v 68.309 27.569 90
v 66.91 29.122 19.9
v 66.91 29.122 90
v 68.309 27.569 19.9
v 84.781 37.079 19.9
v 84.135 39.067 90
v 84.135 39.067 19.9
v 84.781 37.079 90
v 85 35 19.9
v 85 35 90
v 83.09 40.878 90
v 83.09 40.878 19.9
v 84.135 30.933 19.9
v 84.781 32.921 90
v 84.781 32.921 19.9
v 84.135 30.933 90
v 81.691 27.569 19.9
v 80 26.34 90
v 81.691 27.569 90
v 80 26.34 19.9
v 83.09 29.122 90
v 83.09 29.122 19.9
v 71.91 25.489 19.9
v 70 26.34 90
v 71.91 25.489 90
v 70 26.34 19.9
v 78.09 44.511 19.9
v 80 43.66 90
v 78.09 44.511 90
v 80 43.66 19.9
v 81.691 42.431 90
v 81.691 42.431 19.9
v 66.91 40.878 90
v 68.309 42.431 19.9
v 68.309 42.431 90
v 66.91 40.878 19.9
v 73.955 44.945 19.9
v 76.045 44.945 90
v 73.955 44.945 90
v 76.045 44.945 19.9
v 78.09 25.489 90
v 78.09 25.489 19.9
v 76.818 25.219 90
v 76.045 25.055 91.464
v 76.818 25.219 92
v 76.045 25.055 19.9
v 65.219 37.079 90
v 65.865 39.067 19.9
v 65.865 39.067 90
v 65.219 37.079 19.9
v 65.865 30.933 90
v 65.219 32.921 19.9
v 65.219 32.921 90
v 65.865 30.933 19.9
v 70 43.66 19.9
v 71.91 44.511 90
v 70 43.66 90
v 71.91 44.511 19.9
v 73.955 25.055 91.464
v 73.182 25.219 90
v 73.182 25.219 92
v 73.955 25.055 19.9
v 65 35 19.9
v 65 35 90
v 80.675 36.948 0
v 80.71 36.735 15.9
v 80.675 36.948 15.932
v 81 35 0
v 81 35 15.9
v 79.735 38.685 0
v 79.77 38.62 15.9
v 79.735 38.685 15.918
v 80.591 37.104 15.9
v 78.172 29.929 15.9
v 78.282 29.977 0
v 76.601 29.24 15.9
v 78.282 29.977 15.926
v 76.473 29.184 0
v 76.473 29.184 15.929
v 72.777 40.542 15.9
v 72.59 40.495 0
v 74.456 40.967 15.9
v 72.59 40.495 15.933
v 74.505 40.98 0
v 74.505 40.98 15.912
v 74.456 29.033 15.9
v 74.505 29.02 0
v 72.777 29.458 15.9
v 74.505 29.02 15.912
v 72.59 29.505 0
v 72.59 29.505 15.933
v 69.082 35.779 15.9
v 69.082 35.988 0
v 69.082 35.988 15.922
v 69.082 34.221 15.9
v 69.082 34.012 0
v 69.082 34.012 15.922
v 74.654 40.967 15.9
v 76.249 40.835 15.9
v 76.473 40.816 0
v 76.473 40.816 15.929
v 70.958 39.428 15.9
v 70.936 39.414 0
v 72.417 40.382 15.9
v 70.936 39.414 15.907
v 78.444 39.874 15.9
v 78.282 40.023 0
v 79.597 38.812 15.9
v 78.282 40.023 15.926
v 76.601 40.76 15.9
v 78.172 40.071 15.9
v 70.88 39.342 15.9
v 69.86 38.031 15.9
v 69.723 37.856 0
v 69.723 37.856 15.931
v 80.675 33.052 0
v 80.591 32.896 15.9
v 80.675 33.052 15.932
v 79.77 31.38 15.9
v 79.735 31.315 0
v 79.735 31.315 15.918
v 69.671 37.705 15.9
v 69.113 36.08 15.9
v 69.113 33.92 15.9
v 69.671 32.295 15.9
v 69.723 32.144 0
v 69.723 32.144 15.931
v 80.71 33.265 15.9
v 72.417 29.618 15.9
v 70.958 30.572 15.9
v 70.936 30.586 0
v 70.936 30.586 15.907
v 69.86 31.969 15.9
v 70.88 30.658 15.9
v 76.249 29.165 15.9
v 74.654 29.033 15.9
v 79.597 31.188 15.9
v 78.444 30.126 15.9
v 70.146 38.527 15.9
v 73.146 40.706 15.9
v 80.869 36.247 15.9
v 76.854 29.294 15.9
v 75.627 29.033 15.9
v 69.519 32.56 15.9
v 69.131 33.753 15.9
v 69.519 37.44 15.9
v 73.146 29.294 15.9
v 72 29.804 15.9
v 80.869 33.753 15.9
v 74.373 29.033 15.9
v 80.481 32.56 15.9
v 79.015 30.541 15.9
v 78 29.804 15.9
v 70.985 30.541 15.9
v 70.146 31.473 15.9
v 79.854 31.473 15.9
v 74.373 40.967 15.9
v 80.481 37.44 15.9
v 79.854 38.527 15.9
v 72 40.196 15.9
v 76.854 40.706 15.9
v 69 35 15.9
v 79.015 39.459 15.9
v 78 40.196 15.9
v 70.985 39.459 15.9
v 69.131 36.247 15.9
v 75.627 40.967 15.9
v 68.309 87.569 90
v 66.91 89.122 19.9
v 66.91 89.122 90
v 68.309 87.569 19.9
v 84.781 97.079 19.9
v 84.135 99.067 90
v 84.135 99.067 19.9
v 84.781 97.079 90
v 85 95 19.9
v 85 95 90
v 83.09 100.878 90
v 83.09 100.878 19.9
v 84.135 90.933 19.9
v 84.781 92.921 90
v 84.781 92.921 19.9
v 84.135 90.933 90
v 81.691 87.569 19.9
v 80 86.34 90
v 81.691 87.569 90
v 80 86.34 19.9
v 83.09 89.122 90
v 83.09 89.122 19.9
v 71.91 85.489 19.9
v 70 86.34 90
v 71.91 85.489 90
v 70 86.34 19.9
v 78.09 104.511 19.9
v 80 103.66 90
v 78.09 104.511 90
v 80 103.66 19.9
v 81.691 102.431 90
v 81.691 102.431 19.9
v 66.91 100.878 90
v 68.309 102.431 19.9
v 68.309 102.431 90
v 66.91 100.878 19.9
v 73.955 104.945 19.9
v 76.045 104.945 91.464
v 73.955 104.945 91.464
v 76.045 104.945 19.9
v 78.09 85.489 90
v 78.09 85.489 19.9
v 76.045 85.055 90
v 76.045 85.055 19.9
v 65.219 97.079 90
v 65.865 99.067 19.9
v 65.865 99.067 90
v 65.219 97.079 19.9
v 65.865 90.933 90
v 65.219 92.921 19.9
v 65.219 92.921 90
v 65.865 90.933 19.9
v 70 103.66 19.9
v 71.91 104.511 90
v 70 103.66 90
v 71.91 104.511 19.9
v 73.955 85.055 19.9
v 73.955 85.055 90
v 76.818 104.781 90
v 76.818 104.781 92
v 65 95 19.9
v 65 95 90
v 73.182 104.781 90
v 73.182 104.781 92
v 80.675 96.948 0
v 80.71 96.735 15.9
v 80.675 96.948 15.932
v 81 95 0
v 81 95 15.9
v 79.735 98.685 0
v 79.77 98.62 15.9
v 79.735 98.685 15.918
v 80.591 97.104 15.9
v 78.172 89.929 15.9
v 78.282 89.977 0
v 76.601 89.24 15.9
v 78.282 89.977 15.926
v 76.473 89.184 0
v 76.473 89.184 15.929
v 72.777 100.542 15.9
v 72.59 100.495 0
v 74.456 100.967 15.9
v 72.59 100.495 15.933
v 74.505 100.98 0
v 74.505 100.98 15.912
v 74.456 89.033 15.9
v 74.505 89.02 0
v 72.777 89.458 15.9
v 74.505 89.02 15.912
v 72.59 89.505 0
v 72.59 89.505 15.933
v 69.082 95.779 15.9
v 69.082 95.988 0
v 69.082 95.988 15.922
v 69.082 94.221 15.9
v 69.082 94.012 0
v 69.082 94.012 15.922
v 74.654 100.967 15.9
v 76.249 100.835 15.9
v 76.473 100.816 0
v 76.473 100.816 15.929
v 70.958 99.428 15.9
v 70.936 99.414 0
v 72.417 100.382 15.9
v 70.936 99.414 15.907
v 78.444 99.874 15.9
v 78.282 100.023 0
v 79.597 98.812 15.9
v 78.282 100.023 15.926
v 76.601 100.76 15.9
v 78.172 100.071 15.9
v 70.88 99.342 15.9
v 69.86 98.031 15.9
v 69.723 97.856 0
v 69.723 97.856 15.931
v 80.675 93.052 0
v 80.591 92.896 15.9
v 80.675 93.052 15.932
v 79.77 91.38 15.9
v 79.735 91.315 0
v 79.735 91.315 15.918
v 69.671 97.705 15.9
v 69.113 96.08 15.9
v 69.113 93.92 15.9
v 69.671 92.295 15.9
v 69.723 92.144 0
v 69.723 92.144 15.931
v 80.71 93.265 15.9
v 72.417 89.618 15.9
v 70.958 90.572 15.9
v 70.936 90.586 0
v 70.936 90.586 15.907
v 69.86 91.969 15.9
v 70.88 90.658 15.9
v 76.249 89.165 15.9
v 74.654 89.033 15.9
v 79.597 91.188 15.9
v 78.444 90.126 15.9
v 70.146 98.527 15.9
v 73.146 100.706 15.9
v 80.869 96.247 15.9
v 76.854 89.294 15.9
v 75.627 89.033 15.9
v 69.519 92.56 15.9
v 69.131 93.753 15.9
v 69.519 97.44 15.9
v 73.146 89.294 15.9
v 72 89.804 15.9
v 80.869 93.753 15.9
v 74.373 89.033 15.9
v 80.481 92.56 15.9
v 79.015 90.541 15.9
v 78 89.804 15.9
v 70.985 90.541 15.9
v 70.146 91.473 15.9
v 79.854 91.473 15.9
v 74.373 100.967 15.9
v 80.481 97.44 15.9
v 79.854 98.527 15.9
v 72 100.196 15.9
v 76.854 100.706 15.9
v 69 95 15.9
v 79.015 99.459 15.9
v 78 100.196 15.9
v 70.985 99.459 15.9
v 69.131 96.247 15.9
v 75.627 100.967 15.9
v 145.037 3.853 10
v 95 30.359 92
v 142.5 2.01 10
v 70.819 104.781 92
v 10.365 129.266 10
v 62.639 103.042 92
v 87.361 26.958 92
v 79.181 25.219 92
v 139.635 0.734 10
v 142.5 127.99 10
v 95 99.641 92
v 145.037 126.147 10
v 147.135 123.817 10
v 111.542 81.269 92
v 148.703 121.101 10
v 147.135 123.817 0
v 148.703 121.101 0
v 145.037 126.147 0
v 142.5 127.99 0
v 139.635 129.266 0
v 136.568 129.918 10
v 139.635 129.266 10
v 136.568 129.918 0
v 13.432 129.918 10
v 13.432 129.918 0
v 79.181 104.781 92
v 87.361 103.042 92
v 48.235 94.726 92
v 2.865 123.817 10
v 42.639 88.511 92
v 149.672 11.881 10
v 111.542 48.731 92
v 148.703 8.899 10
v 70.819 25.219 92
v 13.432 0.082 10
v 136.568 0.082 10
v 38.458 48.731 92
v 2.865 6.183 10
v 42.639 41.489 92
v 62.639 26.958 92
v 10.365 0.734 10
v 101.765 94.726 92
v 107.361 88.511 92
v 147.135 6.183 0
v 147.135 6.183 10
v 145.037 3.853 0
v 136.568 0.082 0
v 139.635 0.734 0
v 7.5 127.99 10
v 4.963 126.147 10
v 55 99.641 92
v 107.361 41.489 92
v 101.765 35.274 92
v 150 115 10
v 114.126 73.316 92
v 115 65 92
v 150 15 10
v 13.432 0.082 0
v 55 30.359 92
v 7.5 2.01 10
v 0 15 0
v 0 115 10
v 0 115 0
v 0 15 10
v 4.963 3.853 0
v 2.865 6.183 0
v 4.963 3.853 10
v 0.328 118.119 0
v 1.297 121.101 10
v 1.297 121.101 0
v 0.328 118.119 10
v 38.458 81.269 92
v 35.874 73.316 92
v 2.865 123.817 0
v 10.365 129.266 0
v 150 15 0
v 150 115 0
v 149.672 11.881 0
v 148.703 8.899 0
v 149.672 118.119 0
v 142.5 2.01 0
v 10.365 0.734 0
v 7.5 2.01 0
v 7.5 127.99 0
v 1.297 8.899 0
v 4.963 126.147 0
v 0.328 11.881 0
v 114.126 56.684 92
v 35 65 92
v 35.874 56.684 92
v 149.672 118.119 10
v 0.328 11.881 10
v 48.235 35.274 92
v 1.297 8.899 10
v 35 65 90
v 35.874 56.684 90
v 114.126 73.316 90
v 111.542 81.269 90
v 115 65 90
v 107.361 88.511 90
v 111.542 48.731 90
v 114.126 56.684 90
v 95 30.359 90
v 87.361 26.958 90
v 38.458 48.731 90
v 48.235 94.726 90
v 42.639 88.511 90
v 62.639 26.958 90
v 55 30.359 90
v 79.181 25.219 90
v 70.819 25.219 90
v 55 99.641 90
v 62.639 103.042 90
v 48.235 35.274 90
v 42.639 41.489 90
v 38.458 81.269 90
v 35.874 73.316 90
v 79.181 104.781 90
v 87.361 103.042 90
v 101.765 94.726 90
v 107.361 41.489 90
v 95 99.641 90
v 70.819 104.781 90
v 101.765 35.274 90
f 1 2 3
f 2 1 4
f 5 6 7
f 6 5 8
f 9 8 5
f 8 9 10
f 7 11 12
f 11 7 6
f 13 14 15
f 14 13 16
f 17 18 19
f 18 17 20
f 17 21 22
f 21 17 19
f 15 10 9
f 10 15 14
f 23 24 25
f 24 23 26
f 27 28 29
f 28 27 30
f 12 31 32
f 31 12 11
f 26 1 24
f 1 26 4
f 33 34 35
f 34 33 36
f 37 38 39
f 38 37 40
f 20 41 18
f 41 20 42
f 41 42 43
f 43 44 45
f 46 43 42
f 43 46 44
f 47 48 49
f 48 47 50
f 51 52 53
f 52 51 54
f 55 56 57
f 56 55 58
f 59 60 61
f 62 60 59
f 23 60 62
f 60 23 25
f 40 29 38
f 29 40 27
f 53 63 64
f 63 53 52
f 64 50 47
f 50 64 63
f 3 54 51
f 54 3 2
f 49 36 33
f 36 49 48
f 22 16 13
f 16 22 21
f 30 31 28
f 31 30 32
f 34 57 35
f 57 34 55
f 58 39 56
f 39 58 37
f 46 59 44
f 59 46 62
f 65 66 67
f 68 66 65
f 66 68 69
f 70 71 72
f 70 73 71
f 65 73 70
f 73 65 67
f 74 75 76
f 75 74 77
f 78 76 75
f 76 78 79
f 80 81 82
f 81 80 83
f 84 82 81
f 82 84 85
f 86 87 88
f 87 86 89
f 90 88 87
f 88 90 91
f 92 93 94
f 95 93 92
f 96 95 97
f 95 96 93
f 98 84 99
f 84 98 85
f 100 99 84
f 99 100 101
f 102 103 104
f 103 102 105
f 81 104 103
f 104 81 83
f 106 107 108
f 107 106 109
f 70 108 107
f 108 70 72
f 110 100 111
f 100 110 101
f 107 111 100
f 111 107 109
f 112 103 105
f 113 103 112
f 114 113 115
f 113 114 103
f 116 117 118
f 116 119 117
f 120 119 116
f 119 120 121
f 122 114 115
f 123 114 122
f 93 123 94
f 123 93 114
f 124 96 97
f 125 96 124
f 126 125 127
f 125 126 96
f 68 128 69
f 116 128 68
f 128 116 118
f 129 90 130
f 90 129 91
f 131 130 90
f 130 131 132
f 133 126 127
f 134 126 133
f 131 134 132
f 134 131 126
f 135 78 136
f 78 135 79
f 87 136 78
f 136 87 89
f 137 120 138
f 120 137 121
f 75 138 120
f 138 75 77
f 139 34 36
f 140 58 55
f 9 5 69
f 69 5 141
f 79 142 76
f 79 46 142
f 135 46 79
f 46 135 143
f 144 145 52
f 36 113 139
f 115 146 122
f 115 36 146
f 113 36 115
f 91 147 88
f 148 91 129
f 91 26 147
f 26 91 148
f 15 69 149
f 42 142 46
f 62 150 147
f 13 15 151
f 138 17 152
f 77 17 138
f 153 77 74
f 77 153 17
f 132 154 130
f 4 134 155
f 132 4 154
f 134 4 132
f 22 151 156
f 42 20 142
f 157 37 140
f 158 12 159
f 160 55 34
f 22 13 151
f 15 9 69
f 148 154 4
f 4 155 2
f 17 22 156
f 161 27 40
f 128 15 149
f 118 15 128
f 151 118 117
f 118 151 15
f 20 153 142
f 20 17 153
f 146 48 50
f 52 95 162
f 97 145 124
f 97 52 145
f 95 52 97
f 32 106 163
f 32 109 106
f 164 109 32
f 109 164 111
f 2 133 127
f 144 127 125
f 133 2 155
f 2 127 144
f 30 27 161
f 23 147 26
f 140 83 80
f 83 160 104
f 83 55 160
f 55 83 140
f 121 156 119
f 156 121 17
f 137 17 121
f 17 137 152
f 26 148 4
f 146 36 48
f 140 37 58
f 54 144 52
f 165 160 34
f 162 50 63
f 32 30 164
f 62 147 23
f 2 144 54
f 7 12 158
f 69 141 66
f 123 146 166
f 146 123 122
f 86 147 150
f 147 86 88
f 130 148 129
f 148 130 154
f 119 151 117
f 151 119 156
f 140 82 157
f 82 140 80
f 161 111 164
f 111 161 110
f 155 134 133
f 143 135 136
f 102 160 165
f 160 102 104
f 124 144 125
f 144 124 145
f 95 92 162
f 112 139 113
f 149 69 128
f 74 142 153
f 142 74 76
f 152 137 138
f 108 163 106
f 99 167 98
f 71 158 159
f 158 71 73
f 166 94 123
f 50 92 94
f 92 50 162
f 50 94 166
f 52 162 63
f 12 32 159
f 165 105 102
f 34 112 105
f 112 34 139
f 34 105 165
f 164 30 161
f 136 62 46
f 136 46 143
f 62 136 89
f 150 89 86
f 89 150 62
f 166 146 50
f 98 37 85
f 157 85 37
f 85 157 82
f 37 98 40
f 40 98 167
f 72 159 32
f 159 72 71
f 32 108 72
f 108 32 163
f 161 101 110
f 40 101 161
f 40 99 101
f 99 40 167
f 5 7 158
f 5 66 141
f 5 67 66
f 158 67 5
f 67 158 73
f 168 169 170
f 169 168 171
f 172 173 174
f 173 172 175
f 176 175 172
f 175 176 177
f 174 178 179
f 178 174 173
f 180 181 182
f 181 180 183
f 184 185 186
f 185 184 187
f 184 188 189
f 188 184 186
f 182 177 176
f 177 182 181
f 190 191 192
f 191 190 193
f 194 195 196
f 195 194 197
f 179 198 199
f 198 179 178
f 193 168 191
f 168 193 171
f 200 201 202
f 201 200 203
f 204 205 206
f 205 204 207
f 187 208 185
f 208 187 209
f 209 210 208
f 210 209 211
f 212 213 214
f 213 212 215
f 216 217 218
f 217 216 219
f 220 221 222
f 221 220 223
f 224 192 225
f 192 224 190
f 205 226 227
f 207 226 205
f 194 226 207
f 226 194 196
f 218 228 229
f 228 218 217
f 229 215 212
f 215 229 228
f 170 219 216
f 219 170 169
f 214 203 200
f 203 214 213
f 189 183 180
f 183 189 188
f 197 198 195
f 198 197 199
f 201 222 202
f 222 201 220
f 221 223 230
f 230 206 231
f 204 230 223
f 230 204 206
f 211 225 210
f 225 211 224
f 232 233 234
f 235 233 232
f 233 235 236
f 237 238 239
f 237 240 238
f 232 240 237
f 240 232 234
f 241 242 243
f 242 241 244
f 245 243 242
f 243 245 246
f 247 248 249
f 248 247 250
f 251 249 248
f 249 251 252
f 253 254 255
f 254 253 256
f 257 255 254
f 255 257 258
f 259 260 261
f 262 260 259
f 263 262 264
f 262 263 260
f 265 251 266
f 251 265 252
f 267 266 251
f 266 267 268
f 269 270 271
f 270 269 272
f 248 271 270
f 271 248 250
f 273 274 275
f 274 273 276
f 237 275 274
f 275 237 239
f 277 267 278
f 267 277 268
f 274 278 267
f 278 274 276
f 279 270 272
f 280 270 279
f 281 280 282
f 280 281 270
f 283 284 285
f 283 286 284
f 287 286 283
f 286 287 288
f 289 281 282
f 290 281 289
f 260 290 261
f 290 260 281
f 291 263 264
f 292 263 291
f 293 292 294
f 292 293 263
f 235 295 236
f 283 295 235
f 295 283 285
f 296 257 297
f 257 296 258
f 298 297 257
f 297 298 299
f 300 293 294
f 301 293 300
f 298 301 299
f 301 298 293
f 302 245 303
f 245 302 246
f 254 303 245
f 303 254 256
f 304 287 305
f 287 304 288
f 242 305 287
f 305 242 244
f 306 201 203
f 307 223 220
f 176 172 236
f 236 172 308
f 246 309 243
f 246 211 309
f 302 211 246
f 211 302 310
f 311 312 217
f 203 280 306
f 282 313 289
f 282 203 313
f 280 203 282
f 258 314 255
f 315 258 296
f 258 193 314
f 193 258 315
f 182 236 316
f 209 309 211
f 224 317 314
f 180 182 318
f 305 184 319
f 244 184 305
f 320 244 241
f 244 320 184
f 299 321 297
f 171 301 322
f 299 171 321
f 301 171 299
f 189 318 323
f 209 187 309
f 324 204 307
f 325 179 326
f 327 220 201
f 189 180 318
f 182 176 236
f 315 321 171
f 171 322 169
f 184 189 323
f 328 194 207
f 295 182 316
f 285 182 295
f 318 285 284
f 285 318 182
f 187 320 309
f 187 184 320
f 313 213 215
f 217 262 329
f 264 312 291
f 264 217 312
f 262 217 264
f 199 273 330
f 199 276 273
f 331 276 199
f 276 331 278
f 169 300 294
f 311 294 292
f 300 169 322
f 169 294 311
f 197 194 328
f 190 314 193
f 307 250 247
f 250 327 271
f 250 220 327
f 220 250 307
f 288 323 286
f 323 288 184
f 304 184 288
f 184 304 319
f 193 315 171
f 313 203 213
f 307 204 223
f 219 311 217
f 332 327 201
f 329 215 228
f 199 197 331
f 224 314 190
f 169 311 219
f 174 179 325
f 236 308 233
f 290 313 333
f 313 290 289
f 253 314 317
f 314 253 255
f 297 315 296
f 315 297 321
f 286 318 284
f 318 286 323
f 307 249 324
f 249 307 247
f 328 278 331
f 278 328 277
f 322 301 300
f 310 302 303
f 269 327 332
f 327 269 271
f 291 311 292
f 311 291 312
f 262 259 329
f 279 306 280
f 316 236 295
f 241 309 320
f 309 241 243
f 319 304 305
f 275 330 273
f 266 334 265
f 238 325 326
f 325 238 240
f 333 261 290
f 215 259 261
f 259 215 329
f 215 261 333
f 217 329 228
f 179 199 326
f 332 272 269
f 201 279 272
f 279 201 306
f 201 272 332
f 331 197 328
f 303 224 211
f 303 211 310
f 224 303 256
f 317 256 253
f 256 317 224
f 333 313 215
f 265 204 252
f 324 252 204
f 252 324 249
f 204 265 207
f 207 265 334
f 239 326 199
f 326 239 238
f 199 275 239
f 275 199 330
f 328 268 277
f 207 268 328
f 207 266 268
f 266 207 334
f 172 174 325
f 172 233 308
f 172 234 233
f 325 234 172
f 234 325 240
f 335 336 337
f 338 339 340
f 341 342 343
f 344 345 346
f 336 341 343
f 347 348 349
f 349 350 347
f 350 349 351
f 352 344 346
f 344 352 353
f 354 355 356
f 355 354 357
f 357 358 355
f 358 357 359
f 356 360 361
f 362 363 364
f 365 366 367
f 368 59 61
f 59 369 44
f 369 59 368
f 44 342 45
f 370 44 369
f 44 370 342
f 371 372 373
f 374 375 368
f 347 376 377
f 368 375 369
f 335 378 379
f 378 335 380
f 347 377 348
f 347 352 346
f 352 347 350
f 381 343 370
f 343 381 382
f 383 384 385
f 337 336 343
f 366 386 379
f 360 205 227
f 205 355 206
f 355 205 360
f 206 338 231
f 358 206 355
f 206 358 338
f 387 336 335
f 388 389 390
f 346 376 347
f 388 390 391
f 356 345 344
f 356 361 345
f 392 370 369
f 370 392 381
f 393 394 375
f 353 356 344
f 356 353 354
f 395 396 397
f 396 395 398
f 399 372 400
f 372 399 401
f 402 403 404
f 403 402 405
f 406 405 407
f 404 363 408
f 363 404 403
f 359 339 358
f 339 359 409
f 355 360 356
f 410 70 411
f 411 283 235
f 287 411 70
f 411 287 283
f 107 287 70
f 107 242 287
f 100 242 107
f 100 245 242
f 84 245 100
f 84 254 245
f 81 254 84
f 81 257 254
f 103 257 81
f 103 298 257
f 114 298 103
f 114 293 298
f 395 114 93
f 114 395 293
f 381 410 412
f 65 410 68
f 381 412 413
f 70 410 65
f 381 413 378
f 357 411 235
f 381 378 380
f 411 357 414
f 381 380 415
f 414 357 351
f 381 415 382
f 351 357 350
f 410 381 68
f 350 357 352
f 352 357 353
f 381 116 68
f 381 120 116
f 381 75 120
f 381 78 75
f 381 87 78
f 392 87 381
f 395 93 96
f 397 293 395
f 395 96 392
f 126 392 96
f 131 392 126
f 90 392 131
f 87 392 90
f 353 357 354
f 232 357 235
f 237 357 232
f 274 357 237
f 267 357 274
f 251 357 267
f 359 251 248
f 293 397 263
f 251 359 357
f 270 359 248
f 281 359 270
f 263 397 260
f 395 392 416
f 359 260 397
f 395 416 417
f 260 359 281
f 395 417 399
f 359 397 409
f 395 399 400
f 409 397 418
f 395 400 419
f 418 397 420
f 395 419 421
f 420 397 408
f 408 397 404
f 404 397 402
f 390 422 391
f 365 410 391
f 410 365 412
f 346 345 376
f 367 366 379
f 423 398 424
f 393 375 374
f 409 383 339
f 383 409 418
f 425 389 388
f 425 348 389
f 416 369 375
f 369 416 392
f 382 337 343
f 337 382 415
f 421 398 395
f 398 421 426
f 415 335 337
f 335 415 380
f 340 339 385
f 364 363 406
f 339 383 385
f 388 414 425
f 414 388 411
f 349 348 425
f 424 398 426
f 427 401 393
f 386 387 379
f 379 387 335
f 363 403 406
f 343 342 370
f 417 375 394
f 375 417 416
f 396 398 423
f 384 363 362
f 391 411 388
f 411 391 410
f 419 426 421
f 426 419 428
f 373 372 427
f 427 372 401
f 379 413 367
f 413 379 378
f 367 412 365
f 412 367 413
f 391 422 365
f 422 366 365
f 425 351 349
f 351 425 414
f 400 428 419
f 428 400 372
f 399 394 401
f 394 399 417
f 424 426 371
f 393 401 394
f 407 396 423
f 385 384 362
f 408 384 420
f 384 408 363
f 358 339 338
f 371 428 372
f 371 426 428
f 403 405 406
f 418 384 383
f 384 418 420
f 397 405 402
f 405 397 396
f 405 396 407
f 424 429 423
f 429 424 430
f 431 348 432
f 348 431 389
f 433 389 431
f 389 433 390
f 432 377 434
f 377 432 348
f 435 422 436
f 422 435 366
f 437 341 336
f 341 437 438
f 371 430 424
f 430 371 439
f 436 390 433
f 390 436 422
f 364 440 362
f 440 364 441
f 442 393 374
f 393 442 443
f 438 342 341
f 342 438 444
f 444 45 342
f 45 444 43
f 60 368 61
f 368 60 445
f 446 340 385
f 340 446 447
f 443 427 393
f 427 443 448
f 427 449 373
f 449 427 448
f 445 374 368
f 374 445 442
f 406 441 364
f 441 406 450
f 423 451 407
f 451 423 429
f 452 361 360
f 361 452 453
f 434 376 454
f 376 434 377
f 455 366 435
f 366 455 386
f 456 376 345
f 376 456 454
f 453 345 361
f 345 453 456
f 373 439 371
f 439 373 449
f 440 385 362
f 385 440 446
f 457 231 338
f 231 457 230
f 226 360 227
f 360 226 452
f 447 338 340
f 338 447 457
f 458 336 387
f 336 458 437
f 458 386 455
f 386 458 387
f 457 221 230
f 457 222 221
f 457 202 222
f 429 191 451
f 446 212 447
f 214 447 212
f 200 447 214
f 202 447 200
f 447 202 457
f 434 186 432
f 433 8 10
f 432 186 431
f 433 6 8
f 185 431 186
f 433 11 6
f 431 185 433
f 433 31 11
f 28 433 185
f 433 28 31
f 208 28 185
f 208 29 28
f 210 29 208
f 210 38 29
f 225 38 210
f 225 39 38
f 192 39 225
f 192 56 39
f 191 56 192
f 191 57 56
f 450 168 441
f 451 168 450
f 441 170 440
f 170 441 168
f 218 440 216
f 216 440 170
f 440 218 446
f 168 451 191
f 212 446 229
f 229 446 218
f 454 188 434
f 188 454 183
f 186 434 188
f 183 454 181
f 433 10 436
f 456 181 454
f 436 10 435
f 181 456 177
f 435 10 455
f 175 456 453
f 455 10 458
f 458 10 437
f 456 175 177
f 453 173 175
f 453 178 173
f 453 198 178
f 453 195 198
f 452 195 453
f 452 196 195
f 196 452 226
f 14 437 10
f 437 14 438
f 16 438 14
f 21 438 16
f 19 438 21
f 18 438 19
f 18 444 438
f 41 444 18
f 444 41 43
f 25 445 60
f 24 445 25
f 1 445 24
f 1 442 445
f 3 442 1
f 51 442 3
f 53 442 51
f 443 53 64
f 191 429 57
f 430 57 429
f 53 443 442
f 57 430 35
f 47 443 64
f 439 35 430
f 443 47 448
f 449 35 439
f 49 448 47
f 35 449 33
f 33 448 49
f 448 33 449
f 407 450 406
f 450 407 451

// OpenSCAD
bolt=12;
bolt_head=20;
bolt_grip=20;

bolt_gap=60;

felt=80;
felt_h=2;

x=150;
y=130;
z=90;

base=10;

corner=30;

pad=0.1;

module bolt() {
    translate([x/2,y/2,-pad]) {
        translate([0,0,bolt_grip])
        cylinder(d=bolt_head,h=z);
        cylinder(d=bolt,h=z);
        translate([0,0,bolt_grip-(bolt_head-bolt)/2])
        cylinder(d1=bolt,d2=bolt_head,h=(bolt_head-bolt)/2);
    }
}

difference() {
    hull() {
        translate([x/2,y/2,z])
        cylinder(d=felt,h=felt_h);
        translate([corner/2,corner/2,0])
        minkowski() {
            cube([x-corner,y-corner,base/2]);
            cylinder(d=corner,h=base/2);
        }
    }
    translate([x/2,y/2,z])
    cylinder(d=felt,h=felt_h+pad);
    translate([0,-bolt_gap/2,0])
    #bolt();
    translate([0,bolt_gap/2,0])
    #bolt();
}
